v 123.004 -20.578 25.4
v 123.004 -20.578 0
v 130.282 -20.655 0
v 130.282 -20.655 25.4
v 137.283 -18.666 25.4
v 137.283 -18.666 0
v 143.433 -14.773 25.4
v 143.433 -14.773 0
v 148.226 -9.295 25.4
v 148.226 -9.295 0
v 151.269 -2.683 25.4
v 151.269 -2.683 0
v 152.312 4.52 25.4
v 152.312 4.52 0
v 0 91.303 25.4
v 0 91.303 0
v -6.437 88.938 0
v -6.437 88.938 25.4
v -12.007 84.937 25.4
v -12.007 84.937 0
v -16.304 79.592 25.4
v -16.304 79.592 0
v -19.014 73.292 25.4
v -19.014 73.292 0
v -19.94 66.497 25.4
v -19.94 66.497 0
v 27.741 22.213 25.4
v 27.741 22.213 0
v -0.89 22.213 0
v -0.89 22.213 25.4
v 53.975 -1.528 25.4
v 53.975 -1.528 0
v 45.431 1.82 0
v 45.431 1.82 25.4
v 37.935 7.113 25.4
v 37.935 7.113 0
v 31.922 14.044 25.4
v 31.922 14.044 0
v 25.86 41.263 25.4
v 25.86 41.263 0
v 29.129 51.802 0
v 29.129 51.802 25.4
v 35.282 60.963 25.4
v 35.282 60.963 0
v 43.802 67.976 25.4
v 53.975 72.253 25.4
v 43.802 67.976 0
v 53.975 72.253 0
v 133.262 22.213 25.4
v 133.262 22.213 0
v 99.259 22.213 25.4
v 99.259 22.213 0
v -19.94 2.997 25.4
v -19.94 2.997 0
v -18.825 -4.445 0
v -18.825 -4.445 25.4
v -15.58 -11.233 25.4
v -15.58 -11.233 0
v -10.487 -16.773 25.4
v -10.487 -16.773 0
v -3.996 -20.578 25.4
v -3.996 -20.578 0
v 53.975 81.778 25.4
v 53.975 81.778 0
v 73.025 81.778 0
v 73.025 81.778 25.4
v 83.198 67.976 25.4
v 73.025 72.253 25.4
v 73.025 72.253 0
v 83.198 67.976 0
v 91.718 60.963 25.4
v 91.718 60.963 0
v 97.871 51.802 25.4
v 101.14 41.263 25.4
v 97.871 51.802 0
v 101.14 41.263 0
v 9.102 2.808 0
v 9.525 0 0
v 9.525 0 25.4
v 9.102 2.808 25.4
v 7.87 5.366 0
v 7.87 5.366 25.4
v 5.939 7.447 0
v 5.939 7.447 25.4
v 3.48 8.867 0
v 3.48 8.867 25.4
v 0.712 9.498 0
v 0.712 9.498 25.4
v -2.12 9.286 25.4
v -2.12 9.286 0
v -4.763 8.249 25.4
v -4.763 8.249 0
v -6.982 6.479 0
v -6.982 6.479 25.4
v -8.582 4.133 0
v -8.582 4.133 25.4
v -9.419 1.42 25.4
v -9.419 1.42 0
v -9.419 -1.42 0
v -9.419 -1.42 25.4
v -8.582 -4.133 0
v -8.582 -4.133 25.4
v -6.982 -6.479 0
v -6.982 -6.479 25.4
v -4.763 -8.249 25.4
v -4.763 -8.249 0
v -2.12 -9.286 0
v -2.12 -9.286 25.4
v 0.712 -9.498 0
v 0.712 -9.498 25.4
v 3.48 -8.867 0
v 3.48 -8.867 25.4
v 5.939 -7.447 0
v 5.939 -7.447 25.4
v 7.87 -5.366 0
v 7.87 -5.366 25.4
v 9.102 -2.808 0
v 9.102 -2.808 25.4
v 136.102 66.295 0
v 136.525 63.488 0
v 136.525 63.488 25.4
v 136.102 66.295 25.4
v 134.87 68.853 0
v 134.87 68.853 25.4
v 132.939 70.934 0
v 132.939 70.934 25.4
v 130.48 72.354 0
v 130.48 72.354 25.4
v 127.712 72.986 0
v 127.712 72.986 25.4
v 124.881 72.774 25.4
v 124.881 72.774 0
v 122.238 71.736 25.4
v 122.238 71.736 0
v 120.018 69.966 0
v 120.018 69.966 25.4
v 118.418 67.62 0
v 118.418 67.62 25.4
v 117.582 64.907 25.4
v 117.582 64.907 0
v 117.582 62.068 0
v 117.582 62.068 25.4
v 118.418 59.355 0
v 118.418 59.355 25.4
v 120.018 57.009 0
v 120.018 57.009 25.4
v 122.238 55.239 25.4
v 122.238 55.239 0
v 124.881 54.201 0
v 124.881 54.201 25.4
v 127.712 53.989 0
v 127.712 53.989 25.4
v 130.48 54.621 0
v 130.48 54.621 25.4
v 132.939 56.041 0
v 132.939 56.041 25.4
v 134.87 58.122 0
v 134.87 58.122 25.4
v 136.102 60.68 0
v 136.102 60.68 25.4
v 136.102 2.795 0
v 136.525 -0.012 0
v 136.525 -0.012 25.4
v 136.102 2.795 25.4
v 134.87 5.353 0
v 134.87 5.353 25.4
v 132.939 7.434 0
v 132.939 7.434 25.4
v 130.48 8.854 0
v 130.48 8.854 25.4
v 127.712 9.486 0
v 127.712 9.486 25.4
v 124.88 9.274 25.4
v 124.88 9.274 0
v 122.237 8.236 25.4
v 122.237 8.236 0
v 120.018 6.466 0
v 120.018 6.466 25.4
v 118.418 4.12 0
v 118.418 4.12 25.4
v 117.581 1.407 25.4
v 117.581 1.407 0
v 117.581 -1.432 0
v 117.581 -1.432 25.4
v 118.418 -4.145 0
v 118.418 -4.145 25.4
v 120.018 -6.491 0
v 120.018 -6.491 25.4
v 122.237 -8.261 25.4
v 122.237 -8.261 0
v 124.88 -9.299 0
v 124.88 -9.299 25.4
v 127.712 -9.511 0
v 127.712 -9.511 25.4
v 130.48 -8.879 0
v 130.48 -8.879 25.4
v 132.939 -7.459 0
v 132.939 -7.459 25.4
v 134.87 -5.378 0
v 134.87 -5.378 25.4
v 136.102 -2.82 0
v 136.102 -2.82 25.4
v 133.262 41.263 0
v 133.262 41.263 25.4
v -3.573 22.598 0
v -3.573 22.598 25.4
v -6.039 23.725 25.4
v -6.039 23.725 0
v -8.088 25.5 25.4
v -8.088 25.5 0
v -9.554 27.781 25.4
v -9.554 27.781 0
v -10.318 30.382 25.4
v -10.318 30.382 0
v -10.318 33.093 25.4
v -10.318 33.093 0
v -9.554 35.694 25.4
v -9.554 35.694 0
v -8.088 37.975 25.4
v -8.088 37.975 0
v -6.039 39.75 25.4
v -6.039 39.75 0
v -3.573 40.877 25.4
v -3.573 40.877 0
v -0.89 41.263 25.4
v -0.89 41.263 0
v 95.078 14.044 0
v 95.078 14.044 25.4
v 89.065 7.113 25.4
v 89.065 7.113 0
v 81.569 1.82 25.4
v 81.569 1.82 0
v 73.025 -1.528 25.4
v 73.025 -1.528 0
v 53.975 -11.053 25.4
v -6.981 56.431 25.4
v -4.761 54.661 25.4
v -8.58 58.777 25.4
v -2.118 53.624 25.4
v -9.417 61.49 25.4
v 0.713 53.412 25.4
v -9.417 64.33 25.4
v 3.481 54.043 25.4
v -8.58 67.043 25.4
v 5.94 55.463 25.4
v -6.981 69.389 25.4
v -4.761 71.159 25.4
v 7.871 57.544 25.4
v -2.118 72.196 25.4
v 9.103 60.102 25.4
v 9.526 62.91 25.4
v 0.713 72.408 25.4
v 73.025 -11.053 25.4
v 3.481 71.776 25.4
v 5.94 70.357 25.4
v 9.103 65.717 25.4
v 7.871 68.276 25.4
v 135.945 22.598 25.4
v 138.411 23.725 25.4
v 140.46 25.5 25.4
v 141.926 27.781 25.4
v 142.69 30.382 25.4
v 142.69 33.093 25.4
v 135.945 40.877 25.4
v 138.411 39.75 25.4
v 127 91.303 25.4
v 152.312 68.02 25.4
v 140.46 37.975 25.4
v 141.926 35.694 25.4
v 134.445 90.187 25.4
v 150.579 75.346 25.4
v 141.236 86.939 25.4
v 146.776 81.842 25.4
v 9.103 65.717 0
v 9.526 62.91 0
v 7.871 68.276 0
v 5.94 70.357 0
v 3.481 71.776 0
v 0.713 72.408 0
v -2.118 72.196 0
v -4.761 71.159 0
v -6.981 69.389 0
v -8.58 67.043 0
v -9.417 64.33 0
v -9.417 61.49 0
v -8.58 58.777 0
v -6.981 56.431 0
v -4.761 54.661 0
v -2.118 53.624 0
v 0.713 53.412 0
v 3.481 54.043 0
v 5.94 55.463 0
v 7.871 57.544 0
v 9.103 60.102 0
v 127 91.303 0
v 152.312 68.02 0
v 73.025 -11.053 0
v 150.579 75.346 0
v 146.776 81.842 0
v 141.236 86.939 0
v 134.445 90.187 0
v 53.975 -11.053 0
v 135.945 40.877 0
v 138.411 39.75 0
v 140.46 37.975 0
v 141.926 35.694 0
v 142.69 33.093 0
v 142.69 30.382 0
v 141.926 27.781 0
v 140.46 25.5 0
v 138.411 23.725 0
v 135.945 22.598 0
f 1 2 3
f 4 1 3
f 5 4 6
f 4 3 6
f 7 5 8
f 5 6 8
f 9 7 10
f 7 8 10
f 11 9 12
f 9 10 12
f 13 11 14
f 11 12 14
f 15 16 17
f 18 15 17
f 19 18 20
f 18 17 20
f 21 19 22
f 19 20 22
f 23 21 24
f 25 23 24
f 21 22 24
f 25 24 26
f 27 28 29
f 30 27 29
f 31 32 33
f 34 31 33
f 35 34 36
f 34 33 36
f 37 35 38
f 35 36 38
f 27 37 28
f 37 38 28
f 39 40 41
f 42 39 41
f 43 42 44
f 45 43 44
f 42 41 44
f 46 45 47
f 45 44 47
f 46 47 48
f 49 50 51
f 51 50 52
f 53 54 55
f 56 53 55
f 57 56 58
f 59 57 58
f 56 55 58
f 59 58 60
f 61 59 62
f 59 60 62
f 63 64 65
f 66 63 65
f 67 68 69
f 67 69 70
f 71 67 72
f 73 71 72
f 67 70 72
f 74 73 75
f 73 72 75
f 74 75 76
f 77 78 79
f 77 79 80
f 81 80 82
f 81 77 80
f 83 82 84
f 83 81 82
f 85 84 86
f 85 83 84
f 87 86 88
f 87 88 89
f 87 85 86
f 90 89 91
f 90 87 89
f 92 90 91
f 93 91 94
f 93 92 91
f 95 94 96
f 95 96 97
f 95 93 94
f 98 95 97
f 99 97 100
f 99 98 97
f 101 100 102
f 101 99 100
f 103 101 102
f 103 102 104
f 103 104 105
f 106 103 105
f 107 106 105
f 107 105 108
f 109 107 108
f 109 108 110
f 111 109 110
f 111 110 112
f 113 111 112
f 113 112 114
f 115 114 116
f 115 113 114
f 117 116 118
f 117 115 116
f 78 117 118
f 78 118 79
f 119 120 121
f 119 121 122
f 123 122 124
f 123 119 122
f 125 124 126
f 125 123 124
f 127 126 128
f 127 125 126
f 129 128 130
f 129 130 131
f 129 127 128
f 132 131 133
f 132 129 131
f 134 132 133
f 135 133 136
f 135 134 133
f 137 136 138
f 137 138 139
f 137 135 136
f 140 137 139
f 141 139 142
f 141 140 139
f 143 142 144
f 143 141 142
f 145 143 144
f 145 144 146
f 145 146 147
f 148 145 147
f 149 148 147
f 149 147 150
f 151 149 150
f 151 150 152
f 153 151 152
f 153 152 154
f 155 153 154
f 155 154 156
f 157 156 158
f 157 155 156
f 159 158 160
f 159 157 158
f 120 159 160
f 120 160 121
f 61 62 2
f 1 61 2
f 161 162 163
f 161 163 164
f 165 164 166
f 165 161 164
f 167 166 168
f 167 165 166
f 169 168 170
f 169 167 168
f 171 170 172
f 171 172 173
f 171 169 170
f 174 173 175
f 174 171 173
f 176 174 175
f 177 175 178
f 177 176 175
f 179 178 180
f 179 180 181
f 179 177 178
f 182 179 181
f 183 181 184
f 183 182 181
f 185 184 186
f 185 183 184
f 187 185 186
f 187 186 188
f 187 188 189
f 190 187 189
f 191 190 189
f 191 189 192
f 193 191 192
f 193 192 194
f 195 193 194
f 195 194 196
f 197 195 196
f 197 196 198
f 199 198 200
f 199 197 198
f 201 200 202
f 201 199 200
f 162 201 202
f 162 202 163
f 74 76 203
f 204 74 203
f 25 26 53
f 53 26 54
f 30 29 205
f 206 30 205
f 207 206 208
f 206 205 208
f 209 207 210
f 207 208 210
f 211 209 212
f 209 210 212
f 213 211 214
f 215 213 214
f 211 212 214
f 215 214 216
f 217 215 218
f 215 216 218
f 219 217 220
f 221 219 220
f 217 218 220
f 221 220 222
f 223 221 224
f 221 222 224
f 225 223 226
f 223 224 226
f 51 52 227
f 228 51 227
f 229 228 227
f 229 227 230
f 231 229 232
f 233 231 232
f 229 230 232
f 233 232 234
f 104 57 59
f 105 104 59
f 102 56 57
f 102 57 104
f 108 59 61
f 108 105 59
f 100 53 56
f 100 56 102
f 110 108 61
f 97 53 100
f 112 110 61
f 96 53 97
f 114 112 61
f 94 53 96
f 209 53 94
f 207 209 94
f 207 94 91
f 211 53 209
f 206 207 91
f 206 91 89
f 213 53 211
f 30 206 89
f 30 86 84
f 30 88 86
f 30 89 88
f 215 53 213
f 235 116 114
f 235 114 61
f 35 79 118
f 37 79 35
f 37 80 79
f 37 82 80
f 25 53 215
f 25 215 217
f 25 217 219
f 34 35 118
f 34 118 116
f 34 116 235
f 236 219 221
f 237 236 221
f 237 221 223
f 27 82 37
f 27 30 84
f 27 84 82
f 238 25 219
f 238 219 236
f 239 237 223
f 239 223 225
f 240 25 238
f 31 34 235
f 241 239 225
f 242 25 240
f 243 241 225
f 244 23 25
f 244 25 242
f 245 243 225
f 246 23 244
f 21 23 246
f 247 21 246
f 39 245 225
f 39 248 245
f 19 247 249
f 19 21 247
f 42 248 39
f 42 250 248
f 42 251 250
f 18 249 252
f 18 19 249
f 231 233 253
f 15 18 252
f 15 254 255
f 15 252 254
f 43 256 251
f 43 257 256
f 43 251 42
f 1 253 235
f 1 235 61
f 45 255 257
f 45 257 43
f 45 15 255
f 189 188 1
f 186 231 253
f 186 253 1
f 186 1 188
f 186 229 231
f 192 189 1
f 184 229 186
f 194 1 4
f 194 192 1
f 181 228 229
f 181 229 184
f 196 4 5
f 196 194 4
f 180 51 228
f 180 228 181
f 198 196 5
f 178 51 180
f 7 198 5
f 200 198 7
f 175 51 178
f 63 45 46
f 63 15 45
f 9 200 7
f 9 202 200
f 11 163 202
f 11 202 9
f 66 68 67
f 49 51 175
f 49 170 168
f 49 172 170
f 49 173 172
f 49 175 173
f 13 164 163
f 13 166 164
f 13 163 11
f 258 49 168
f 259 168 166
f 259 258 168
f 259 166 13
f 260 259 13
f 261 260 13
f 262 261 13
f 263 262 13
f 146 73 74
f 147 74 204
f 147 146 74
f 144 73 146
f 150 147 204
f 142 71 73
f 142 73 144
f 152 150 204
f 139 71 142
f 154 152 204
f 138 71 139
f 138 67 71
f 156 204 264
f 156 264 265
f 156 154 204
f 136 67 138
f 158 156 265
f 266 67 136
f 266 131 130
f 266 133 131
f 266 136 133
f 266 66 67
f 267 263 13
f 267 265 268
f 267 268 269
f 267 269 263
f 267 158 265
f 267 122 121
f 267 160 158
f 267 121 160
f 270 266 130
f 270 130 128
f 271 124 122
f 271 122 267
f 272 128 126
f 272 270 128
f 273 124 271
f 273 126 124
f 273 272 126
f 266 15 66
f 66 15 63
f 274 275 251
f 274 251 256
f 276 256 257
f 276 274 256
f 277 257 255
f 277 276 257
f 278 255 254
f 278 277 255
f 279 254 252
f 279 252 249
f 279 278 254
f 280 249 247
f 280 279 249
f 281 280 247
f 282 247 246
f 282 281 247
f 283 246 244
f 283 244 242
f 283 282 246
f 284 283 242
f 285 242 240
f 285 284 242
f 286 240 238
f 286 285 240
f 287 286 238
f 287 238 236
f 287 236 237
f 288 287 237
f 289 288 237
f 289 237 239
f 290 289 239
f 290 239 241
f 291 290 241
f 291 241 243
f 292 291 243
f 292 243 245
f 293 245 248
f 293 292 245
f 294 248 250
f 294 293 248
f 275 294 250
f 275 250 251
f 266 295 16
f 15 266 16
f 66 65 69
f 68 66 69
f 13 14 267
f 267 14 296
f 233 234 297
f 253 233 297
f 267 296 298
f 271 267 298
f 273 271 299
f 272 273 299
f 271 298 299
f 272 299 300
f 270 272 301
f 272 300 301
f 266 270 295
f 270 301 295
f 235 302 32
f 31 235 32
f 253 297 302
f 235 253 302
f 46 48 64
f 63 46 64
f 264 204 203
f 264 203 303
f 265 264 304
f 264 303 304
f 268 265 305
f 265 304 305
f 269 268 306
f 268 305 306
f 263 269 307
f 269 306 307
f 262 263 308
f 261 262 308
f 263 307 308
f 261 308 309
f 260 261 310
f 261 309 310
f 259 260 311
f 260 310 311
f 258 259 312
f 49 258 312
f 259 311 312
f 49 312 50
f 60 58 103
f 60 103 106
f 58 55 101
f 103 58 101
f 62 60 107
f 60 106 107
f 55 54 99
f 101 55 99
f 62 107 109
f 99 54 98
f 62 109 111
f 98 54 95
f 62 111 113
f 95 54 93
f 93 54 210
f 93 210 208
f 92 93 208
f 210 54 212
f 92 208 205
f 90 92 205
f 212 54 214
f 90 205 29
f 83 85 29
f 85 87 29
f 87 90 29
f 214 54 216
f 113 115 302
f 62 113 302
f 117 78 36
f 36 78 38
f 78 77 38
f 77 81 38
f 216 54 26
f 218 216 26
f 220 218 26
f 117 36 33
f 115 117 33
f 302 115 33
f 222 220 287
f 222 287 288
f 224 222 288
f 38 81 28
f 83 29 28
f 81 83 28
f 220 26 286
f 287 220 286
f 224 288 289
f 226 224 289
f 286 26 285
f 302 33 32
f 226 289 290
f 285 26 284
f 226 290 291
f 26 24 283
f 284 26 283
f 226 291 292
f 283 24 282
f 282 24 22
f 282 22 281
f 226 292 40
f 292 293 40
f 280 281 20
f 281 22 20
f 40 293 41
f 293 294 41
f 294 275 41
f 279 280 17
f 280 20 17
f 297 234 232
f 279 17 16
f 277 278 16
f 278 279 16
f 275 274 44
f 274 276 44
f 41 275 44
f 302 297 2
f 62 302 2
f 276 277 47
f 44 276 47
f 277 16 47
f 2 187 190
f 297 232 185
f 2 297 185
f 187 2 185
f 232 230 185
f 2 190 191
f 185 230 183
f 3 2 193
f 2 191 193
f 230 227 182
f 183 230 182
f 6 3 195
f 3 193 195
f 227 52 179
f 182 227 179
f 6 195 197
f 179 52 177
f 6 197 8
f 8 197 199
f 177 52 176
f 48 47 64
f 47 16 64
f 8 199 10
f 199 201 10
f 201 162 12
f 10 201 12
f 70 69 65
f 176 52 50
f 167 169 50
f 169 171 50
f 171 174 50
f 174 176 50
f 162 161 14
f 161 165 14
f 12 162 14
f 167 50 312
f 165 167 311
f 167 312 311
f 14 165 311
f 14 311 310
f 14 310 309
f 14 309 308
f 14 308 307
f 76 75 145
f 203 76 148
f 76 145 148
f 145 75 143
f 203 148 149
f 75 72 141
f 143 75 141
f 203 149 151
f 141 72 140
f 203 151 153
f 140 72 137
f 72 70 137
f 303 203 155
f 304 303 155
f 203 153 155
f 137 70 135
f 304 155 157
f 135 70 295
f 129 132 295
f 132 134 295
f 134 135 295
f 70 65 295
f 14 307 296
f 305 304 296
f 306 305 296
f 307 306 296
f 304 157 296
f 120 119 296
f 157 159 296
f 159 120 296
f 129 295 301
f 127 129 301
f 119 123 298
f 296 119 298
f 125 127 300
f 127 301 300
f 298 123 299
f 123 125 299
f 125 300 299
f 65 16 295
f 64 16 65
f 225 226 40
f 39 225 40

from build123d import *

# Parameters (mm, degrees)
SKETCH1_R           = 9.525
BOSS_EXTRUDE1_DEPTH = 25.4


with BuildPart() as part:
    # Sketch1 → Boss-Extrude1 (new body)
    with BuildSketch(Plane.XY):
        with BuildLine():
            Line((-3.995852665, -20.577576414), (123.004147335, -20.577576414))
            ThreePointArc((123.004147335, -20.577576414), (143.432942762, -14.772522971), (152.311571269, 4.520073639))
            Line((152.311571269, 4.520073639), (152.311571269, 68.020073639))
            ThreePointArc((152.311571269, 68.020073639), (144.195614803, 84.596871175), (126.99997378, 91.302756331))
            Line((126.99997378, 91.302756331), (-2.622e-05, 91.302756331))
            ThreePointArc((-2.622e-05, 91.302756331), (-14.336851136, 82.409941414), (-19.939739045, 66.496602579))
            Line((-19.939739045, 66.496602579), (-19.939739045, 2.996602579))
            ThreePointArc((-19.939739045, 2.996602579), (-15.579526187, -11.233202656), (-3.995852665, -20.577576414))
        make_face()
        Circle(SKETCH1_R, mode=Mode.SUBTRACT)
        with Locations((0.00144481, 62.909901332)):
            Circle(SKETCH1_R, mode=Mode.SUBTRACT)
        with Locations((127.000131197, 63.487530849)):
            Circle(SKETCH1_R, mode=Mode.SUBTRACT)
        with Locations((126.999999388, -0.01246915)):
            Circle(SKETCH1_R, mode=Mode.SUBTRACT)
        with BuildLine():
            Line((-0.889739045, 41.26253085), (25.859586911, 41.26253085))
            ThreePointArc((25.859586911, 41.26253085), (35.282229592, 60.962735138), (53.975, 72.252756331))
            Line((53.975, 72.252756331), (53.975, 81.777756331))
            Line((53.975, 81.777756331), (62.356166676, 81.777756331))
            Line((62.356166676, 81.777756331), (73.025, 81.777756331))
            Line((73.025, 81.777756331), (73.025, 72.252756331))
            ThreePointArc((73.025, 72.252756331), (91.717770408, 60.962735138), (101.140413089, 41.26253085))
            Line((101.140413089, 41.26253085), (133.261571269, 41.26253085))
            ThreePointArc((133.261571269, 41.26253085), (142.786571269, 31.73753085), (133.261571269, 22.21253085))
            Line((133.261571269, 22.21253085), (99.258718454, 22.21253085))
            ThreePointArc((99.258718454, 22.21253085), (89.064662377, 7.11266894), (73.025, -1.527576414))
            Line((73.025, -1.527576414), (73.025, -11.052576414))
            Line((73.025, -11.052576414), (62.799638263, -11.052576414))
            Line((62.799638263, -11.052576414), (53.975, -11.052576414))
            Line((53.975, -11.052576414), (53.975, -1.527576414))
            ThreePointArc((53.975, -1.527576414), (37.935337623, 7.11266894), (27.741281546, 22.21253085))
            Line((27.741281546, 22.21253085), (-0.889739045, 22.21253085))
            ThreePointArc((-0.889739045, 22.21253085), (-10.414739045, 31.73753085), (-0.889739045, 41.26253085))
        make_face(mode=Mode.SUBTRACT)
    extrude(amount=BOSS_EXTRUDE1_DEPTH)


solid = part.part
